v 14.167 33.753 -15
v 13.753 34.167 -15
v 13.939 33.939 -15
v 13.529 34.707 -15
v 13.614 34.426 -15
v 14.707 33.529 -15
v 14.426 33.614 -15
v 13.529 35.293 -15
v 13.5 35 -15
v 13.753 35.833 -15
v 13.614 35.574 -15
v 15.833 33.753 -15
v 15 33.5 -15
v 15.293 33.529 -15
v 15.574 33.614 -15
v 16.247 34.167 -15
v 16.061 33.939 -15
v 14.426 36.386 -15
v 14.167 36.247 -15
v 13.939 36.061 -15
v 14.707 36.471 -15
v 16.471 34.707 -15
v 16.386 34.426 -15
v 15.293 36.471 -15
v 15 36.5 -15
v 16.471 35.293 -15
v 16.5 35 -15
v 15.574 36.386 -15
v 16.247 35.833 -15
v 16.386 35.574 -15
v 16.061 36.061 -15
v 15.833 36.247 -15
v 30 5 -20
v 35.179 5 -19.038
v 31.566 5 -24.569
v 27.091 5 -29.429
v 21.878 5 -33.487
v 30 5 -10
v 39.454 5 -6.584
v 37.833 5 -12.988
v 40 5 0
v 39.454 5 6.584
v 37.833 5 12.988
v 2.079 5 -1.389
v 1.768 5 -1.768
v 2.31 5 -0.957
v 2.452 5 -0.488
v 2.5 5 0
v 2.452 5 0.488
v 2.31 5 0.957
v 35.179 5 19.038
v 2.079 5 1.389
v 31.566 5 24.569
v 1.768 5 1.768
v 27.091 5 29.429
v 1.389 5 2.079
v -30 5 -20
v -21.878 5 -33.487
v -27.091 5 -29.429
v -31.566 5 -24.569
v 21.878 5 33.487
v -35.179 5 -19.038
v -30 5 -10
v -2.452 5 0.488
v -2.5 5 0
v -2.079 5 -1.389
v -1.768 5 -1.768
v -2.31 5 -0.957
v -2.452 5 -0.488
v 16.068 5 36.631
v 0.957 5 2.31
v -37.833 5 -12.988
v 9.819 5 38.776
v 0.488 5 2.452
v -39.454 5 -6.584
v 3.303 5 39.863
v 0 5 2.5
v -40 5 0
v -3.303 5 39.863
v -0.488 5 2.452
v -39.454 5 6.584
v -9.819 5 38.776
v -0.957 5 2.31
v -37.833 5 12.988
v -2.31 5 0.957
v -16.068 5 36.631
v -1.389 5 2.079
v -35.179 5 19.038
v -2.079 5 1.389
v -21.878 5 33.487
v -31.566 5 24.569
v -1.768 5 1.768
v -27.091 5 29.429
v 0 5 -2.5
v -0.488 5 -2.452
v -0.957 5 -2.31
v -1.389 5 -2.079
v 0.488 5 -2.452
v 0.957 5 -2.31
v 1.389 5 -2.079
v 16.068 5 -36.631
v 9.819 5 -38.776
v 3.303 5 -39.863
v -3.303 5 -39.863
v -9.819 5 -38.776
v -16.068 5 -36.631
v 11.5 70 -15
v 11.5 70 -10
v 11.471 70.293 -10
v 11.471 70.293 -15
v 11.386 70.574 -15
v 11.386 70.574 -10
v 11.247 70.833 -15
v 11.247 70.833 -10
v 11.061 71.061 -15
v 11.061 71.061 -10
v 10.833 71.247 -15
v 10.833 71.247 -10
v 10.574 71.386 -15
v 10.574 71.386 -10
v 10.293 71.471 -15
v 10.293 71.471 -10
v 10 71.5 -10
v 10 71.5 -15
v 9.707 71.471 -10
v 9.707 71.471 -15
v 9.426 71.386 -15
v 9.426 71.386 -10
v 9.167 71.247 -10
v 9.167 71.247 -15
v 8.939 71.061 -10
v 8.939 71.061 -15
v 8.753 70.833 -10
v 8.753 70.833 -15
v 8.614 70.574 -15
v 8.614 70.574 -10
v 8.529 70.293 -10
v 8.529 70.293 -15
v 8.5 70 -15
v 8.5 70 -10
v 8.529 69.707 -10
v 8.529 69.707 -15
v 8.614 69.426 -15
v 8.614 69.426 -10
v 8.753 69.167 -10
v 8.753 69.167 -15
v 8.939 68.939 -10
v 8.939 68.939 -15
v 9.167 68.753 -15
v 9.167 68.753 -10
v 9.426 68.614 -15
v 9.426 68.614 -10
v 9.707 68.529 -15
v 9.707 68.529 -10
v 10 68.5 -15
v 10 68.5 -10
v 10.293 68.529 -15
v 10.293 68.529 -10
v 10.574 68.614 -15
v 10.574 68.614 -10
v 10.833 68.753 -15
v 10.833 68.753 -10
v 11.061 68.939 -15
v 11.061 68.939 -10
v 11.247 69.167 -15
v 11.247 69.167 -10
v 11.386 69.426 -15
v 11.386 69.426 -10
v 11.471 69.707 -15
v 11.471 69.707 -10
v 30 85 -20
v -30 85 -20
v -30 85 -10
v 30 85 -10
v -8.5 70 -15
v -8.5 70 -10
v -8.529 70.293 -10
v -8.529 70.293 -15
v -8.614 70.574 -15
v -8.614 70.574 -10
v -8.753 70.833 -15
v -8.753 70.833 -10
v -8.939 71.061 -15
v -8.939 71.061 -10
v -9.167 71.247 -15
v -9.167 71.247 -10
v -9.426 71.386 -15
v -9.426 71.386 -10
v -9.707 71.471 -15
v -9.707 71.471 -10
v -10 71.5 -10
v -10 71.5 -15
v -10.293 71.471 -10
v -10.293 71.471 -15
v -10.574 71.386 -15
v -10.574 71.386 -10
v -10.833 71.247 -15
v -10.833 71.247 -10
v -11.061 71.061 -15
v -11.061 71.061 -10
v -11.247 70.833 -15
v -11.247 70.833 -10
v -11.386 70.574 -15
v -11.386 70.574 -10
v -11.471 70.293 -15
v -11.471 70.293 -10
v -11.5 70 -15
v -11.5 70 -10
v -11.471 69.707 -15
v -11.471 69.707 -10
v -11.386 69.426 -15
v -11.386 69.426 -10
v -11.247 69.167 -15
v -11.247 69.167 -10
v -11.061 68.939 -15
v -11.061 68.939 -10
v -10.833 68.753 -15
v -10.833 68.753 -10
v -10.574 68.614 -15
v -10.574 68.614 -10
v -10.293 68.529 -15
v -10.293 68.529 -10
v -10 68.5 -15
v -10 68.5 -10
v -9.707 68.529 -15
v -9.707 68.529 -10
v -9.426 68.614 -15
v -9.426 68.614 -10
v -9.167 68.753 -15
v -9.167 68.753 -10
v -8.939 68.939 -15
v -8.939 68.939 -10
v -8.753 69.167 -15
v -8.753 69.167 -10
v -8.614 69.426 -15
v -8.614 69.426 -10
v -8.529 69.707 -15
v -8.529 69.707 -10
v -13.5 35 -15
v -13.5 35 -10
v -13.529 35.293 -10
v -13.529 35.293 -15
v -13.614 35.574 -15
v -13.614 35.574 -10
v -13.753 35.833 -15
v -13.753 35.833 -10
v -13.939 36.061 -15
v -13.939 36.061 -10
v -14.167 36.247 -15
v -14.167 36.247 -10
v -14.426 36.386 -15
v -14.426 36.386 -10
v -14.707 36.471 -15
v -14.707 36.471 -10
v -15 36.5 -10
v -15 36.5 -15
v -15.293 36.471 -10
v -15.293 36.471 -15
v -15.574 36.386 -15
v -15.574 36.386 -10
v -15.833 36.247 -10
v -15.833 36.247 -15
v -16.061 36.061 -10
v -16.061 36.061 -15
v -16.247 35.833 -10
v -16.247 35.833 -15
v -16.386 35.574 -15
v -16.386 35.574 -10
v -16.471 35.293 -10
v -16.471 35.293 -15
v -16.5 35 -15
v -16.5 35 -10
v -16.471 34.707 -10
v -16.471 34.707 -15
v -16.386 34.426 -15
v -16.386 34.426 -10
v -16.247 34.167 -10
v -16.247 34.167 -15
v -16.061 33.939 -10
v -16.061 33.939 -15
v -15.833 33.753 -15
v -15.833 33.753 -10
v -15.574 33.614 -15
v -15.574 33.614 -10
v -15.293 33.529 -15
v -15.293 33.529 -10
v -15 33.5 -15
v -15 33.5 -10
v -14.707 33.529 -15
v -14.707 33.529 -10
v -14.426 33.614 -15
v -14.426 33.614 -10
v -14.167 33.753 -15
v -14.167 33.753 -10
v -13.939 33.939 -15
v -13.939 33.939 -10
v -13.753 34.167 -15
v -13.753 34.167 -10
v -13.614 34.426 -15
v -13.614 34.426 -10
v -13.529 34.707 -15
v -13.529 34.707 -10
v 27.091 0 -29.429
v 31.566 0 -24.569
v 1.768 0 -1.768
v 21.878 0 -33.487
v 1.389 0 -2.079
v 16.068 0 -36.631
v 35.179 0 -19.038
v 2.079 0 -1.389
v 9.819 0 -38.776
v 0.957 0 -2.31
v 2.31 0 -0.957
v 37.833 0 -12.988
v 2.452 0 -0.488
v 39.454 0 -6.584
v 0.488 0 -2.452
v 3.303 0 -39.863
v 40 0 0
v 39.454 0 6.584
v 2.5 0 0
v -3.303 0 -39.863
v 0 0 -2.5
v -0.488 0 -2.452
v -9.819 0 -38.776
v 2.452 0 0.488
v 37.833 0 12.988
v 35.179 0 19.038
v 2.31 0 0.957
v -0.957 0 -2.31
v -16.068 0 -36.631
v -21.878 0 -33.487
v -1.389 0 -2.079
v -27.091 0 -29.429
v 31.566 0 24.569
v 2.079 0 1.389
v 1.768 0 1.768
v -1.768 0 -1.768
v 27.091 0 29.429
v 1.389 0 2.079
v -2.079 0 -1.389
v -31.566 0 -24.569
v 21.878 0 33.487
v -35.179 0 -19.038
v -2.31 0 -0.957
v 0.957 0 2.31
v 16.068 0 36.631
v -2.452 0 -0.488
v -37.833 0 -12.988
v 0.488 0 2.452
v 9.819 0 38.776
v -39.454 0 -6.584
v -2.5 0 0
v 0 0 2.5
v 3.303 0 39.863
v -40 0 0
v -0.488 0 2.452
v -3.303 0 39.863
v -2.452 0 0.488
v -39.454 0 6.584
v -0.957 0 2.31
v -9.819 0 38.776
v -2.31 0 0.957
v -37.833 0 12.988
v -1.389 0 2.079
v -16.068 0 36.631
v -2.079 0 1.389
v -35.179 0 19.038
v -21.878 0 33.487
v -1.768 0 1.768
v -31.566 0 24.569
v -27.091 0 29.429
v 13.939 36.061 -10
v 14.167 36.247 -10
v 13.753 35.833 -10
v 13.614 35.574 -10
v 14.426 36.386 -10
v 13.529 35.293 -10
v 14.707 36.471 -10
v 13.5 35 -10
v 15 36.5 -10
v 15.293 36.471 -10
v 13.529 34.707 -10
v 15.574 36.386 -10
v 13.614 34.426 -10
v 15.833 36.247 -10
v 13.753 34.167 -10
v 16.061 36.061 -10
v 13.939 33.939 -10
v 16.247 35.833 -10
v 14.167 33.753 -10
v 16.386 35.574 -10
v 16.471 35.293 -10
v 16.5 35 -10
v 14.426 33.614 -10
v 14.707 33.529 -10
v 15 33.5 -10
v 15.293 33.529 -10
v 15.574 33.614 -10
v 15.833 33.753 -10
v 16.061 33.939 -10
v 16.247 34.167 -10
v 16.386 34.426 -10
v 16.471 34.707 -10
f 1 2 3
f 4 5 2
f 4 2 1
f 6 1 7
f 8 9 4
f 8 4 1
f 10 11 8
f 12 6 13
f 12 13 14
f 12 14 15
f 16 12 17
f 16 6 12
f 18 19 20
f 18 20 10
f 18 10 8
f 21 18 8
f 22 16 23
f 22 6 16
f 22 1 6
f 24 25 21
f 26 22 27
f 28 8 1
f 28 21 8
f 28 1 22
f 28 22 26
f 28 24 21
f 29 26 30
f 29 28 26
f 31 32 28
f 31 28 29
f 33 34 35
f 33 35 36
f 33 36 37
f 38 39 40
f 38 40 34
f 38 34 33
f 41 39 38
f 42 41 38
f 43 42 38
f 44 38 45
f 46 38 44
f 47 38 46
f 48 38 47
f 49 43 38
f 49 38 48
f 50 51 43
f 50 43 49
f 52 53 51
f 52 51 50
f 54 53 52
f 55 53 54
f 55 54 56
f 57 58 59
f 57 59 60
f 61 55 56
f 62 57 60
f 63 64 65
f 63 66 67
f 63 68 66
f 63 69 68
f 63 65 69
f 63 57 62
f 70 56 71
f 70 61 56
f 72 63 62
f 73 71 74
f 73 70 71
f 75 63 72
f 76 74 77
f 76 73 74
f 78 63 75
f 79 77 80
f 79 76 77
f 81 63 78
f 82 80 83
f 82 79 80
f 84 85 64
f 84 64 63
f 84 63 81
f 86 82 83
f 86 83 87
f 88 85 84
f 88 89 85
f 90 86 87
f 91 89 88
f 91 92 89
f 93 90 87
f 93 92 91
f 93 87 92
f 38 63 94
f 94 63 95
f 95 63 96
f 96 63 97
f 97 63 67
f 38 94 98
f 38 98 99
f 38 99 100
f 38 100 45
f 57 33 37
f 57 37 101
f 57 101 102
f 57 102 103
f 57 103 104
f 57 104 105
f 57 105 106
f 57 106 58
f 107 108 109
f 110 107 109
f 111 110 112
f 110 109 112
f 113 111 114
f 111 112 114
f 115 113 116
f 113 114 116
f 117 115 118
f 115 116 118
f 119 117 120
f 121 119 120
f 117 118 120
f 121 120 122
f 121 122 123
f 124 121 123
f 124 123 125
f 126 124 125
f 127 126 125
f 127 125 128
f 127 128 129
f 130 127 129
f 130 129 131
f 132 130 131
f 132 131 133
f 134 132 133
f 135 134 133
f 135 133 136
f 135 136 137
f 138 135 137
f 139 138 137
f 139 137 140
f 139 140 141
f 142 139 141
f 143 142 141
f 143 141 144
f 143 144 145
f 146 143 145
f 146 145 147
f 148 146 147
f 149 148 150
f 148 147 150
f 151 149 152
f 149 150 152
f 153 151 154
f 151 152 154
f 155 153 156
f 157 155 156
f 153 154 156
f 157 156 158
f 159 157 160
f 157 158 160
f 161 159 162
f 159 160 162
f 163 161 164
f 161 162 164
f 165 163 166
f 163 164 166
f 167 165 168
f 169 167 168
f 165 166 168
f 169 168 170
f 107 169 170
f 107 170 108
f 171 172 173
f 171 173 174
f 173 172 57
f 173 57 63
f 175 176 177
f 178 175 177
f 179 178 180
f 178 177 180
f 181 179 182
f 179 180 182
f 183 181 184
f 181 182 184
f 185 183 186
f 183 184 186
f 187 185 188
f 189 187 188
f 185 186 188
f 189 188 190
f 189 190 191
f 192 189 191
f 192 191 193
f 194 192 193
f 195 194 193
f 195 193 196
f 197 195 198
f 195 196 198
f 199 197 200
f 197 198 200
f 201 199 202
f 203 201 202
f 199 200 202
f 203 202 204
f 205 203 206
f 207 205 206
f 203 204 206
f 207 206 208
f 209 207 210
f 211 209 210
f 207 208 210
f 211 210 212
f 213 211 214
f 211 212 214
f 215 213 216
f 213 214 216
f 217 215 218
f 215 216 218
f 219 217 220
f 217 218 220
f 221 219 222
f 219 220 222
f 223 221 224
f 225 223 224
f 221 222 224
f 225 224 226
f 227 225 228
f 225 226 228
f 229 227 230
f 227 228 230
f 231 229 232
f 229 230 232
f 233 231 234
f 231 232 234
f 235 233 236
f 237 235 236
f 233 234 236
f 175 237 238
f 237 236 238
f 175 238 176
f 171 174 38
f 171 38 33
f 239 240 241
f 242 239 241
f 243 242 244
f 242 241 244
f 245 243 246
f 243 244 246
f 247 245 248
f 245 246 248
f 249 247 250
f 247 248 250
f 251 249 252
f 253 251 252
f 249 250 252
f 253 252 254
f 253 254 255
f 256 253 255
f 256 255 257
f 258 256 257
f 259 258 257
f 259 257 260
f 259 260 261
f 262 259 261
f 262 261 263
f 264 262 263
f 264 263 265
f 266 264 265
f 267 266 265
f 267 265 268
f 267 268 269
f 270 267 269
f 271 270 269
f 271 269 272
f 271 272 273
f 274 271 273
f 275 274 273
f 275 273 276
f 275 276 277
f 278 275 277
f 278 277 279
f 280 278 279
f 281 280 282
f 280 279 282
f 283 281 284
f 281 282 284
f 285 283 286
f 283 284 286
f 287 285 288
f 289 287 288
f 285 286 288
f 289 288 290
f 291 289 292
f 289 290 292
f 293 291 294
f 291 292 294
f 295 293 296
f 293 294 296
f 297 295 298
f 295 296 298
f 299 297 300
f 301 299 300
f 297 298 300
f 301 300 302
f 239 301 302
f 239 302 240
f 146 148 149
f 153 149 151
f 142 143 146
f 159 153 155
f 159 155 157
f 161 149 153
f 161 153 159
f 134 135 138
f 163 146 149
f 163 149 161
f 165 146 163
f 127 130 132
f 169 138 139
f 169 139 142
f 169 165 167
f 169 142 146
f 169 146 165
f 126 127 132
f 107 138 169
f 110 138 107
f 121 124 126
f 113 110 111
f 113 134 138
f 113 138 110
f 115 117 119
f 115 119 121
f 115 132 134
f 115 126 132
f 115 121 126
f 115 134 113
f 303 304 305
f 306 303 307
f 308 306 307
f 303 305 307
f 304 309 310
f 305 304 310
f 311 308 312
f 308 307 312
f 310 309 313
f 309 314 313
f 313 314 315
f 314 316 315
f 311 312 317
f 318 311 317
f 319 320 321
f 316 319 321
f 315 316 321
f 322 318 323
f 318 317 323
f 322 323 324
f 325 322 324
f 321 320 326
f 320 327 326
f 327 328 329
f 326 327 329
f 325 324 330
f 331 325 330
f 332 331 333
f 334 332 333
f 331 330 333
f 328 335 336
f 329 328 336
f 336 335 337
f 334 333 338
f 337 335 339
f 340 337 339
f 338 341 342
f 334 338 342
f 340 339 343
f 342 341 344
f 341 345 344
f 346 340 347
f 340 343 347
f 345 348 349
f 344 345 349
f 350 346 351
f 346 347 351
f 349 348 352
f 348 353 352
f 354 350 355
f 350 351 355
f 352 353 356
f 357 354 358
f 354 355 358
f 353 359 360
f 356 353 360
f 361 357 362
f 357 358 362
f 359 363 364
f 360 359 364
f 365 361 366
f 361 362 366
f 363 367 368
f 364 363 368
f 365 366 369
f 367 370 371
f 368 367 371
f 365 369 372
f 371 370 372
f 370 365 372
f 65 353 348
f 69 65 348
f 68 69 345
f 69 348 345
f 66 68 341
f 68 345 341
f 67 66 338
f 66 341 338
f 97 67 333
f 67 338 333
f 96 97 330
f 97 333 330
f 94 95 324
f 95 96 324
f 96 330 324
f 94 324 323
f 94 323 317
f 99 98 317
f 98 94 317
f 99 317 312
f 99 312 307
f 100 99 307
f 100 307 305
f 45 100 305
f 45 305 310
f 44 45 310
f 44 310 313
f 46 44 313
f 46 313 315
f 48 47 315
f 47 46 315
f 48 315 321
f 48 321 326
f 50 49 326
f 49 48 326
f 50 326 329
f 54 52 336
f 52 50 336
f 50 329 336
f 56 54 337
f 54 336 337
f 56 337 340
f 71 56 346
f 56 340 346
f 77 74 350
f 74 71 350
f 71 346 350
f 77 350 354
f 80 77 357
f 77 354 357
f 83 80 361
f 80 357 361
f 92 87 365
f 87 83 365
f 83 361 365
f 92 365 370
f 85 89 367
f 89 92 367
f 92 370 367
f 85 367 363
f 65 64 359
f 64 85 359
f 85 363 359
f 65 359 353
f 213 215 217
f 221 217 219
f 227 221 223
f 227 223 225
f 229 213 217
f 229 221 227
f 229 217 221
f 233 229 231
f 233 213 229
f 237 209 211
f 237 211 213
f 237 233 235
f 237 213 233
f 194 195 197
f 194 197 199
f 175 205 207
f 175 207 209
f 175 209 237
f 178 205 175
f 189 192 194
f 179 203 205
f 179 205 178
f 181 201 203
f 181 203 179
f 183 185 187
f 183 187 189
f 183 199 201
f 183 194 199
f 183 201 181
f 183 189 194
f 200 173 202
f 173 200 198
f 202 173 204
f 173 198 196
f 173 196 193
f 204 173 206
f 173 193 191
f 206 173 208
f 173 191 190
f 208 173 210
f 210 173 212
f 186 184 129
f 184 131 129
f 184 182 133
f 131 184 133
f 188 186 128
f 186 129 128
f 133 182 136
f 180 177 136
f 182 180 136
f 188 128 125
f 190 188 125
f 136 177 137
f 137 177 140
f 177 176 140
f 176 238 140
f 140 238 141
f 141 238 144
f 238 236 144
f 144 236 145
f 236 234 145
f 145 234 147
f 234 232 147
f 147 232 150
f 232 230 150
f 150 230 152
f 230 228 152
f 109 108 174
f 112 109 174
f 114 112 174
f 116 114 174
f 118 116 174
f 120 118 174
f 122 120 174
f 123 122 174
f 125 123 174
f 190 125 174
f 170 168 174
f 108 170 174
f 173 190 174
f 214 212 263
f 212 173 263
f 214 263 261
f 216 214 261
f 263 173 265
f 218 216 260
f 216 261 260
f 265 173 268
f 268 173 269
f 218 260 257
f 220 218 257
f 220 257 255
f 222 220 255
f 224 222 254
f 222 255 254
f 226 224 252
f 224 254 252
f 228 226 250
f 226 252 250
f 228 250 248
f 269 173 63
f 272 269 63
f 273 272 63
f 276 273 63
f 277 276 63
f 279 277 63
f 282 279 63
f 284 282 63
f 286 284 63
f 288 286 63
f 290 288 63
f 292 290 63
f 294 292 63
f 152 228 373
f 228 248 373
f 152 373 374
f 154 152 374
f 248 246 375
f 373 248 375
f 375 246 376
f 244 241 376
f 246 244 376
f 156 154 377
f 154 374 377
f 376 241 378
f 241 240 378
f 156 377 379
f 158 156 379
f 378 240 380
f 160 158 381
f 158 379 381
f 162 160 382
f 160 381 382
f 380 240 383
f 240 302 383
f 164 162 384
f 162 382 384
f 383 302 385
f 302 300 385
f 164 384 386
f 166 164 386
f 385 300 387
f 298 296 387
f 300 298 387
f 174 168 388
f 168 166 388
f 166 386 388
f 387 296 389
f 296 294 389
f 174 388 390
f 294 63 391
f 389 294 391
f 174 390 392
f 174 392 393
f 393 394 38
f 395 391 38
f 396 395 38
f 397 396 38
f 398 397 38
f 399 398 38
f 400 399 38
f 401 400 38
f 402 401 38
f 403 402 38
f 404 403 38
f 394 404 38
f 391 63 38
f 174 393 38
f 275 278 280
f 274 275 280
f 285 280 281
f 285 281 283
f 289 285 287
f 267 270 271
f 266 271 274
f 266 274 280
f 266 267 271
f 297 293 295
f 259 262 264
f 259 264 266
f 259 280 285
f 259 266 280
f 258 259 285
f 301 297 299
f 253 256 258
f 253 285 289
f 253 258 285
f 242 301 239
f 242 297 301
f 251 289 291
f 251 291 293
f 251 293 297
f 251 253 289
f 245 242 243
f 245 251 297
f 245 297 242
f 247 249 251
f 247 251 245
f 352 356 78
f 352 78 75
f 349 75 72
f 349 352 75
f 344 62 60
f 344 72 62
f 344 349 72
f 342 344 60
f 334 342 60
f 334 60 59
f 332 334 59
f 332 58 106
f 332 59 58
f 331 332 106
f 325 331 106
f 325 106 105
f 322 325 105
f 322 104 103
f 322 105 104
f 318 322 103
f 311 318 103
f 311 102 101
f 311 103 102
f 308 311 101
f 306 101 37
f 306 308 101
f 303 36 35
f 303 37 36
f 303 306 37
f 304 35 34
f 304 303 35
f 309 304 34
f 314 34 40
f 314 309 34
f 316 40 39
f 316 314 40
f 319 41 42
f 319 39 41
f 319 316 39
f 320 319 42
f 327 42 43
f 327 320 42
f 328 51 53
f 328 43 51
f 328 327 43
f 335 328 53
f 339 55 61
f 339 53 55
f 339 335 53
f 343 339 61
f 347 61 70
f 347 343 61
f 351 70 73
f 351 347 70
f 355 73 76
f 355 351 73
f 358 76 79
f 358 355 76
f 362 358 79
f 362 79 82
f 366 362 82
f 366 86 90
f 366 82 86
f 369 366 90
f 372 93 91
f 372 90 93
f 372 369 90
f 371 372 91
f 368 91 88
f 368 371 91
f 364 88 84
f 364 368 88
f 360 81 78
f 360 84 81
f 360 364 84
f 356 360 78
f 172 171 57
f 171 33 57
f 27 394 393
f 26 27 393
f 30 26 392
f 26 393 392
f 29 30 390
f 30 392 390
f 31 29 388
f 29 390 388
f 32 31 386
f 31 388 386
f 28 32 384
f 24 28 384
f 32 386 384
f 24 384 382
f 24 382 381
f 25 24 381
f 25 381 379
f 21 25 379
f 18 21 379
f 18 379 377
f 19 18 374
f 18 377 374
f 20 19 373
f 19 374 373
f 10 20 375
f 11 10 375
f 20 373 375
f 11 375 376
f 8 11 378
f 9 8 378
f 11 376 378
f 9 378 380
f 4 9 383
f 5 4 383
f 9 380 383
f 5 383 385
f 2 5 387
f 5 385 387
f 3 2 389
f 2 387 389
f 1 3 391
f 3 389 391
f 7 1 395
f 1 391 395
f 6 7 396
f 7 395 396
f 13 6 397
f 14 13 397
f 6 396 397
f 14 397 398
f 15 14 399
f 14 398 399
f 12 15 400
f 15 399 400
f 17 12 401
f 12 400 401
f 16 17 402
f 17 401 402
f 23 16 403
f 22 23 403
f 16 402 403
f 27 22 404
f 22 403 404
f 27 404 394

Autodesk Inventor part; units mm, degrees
ref_plane "YZ Plane" through (0, 0, 0) normal (1, 0, 0) x (0, 1, 0)
ref_plane "XZ Plane" through (0, 0, 0) normal (0, 1, 0) x (-1, 0, 0)
ref_plane "XY Plane" through (0, 0, 0) normal (0, 0, 1) x (1, 0, 0)
sketch "Sketch1" plane through (0, 0, 0) normal (0, 1, 0) x (-1, 0, 0)
  circle A0 centre (0, 0) radius 40
  circle A1 centre (0, 0) radius 2.5
  dimension "d0" = 80
  dimension "d1" = 5
extrude "Extrusion1" add sketch "Sketch1" along normal blind 5
sketch "Sketch2" plane through (0, 5, 0) normal (0, 1, 0) x (1, 0, 0)
  line L0 (0, 10) -> (30, 10)
  line L1 (30, 10) -> (30, 20)
  line L2 (30, 20) -> (0, 20)
  line L3 (0, 20) -> (-30, 20)
  line L4 (-30, 20) -> (-30, 10)
  line L5 (-30, 10) -> (0, 10)
  point P0 (0, 0)
  dimension "d5" = 30
  dimension "d6" = 10
extrude "Extrusion2" add sketch "Sketch2" along normal blind 80
sketch "Sketch3" plane through (-30, 5, -10) normal (0, 0, 1) x (1, 0, 0)
  line L0 (60, 80) -> (0, 80) projected
  circle A0 centre (40, 65) radius 1.5
  circle A1 centre (20, 65) radius 1.5
  line L1 (0, 0) -> (0, 80) projected
  circle A2 centre (45, 30) radius 1.5
  circle A3 centre (15, 30) radius 1.5
  point P0 (30, -5)
  dimension "d13" = 3
  dimension "d14" = 3
  dimension "d18" = 3
  dimension "d19" = 3
extrude "Extrusion3" cut sketch "Sketch3" against normal blind 5
sketch "Sketch4" plane through (-30, 5, -10) normal (0, 0, 1) x (1, 0, 0)
  point P0 (30, -5)
properties part number "gripper"
